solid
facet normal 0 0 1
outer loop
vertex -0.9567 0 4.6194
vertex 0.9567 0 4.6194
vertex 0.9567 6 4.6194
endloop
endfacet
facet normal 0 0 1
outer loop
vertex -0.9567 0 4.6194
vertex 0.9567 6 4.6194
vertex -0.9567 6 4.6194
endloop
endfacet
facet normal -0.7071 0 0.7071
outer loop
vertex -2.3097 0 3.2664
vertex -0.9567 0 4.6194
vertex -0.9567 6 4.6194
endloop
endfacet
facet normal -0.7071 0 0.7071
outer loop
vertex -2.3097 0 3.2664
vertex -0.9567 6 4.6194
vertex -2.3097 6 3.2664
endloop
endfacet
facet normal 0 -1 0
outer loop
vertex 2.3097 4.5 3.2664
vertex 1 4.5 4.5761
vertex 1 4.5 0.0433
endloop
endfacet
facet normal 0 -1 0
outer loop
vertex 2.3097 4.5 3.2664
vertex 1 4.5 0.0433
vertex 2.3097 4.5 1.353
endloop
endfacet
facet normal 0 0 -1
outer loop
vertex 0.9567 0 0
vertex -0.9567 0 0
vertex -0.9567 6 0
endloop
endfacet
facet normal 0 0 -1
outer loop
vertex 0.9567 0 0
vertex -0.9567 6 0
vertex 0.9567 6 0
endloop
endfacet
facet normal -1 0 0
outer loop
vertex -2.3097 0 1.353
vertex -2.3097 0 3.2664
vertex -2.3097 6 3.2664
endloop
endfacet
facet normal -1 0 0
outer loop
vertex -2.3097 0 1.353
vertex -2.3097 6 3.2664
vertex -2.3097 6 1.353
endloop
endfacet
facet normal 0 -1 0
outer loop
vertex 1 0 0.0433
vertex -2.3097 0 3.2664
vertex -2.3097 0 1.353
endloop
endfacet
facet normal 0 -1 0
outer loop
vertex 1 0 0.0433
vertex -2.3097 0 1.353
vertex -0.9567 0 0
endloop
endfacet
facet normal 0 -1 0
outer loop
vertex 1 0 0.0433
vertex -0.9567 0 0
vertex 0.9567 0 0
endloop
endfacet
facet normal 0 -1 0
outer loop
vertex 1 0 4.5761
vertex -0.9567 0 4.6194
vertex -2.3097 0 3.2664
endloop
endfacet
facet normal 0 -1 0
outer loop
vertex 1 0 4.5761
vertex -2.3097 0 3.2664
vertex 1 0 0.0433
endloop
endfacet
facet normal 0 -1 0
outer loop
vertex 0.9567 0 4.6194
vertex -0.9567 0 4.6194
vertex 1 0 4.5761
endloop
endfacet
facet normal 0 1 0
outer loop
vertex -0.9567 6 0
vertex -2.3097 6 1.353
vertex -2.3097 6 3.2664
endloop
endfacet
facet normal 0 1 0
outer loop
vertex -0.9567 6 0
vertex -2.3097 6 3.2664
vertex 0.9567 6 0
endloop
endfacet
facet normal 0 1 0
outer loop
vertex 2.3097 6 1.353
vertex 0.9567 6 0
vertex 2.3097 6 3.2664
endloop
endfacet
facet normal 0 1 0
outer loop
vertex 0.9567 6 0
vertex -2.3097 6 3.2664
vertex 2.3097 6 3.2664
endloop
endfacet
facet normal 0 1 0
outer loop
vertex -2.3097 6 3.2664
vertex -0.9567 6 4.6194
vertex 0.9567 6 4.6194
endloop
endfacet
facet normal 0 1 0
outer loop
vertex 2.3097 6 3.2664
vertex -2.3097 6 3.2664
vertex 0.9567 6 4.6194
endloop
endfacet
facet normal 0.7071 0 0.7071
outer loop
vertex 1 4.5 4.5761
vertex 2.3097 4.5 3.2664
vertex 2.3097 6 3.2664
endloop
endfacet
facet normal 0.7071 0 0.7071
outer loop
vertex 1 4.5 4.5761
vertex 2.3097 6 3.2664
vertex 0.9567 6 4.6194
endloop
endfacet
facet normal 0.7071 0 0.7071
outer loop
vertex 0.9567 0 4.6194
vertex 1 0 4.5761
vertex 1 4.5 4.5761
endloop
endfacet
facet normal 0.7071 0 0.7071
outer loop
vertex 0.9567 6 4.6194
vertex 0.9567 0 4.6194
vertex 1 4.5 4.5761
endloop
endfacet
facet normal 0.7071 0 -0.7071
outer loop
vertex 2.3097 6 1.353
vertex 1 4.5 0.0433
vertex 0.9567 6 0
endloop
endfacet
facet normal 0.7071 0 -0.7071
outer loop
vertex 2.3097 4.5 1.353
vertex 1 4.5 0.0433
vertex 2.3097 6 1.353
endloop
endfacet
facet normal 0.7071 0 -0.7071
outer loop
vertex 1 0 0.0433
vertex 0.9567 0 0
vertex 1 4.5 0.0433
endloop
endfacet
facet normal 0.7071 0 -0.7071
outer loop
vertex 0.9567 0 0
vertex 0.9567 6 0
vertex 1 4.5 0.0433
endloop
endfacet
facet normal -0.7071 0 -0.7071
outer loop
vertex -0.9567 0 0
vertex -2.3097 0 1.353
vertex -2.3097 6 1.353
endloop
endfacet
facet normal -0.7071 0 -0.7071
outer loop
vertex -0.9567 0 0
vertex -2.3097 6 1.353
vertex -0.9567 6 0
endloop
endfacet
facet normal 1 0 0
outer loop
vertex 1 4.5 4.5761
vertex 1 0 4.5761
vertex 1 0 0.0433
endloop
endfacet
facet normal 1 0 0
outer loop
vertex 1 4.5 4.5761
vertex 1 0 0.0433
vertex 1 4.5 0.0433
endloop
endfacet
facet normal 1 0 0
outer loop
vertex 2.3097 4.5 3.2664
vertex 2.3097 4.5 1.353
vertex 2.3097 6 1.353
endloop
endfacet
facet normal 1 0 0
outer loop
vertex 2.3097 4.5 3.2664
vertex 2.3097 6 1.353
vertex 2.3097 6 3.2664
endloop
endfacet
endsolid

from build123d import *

# Parameters (mm, degrees)
BOX008_W         = 2
BOX008_H         = 4.5
BOX008_DEPTH     = 6
EXTRUDE004_DEPTH = 6


with BuildPart() as box008:
    # Box008 → Box008 (new body)
    with BuildSketch(Plane(origin=(1, 0, -0.5), x_dir=(1, 0, 0), z_dir=(0, 0, 1))):
        with Locations((1, 2.25)):
            Rectangle(BOX008_W, BOX008_H)
    extrude(amount=BOX008_DEPTH)


with BuildPart() as octpin_wnotch:
    # Sketch002 → Extrude004 (new body)
    with BuildSketch(Plane.XZ):
        Polygon((2.309699, 1.35299), (2.309699, 3.266407), (0.956709, 4.619398), (-0.956709, 4.619398), (-2.309699, 3.266407), (-2.309699, 1.35299), (-0.956709, 0), (0.956709, 0), align=None)
    extrude(amount=-EXTRUDE004_DEPTH)

    # Cut: cut Box008
    add(box008.part, mode=Mode.SUBTRACT)


solid = octpin_wnotch.part
